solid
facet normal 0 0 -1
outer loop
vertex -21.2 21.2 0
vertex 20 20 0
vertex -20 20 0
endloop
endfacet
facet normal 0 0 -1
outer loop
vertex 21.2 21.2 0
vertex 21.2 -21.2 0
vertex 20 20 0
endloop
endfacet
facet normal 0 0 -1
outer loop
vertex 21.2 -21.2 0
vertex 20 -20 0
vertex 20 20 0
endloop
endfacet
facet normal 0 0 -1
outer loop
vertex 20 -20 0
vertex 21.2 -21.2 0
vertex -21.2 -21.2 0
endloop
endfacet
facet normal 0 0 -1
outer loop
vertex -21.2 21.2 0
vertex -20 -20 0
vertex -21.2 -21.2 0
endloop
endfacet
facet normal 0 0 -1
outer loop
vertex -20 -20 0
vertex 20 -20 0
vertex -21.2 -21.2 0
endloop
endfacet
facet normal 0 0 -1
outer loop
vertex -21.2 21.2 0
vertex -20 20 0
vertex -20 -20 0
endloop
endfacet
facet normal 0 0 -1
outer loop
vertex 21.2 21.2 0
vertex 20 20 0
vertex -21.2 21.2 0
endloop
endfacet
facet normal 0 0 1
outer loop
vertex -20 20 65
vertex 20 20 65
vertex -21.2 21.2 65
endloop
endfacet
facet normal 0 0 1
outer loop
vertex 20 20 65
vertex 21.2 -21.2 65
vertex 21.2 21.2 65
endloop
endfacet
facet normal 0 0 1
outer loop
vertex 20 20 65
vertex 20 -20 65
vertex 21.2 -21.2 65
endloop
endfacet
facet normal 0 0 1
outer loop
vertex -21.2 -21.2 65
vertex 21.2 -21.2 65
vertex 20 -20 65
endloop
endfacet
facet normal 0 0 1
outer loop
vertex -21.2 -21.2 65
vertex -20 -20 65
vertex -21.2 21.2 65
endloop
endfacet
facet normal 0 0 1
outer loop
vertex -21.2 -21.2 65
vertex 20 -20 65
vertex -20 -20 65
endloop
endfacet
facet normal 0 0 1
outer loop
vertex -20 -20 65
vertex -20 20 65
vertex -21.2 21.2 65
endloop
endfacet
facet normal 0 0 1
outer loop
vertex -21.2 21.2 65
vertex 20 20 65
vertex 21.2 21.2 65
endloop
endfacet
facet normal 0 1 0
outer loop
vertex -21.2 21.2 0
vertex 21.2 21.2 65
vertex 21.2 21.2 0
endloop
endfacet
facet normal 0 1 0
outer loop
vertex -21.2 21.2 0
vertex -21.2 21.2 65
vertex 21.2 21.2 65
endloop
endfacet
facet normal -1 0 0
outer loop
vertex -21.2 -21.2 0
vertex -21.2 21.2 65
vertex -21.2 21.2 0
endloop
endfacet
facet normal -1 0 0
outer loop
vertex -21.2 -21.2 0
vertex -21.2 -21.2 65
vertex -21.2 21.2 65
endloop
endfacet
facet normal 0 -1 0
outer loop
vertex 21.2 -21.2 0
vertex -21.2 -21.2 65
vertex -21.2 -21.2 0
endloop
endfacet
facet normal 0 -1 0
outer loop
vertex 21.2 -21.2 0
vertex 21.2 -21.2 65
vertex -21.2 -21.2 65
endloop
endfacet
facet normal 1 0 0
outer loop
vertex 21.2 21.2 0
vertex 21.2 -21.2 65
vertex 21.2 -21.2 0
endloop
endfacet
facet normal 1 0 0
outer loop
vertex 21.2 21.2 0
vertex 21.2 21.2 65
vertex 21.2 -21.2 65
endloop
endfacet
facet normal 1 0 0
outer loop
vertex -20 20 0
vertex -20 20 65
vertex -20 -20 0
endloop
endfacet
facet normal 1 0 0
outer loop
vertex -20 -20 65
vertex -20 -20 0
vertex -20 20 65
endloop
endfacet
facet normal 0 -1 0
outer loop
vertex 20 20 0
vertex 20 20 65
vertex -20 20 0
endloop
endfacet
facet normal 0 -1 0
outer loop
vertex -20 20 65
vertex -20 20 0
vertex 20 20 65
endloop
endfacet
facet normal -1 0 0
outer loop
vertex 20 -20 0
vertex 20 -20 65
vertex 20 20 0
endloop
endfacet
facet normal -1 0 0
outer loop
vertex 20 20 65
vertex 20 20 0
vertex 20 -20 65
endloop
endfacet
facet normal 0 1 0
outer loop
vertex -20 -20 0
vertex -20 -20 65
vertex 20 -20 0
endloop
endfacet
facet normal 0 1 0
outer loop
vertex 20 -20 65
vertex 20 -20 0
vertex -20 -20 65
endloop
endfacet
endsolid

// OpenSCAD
fan_size = [40,40];

housing();


module housing() {
    linear_extrude(65) difference() {
        square(fan_size+[6*0.4, 6*0.4], true);
        square(fan_size, true);
    }
}
